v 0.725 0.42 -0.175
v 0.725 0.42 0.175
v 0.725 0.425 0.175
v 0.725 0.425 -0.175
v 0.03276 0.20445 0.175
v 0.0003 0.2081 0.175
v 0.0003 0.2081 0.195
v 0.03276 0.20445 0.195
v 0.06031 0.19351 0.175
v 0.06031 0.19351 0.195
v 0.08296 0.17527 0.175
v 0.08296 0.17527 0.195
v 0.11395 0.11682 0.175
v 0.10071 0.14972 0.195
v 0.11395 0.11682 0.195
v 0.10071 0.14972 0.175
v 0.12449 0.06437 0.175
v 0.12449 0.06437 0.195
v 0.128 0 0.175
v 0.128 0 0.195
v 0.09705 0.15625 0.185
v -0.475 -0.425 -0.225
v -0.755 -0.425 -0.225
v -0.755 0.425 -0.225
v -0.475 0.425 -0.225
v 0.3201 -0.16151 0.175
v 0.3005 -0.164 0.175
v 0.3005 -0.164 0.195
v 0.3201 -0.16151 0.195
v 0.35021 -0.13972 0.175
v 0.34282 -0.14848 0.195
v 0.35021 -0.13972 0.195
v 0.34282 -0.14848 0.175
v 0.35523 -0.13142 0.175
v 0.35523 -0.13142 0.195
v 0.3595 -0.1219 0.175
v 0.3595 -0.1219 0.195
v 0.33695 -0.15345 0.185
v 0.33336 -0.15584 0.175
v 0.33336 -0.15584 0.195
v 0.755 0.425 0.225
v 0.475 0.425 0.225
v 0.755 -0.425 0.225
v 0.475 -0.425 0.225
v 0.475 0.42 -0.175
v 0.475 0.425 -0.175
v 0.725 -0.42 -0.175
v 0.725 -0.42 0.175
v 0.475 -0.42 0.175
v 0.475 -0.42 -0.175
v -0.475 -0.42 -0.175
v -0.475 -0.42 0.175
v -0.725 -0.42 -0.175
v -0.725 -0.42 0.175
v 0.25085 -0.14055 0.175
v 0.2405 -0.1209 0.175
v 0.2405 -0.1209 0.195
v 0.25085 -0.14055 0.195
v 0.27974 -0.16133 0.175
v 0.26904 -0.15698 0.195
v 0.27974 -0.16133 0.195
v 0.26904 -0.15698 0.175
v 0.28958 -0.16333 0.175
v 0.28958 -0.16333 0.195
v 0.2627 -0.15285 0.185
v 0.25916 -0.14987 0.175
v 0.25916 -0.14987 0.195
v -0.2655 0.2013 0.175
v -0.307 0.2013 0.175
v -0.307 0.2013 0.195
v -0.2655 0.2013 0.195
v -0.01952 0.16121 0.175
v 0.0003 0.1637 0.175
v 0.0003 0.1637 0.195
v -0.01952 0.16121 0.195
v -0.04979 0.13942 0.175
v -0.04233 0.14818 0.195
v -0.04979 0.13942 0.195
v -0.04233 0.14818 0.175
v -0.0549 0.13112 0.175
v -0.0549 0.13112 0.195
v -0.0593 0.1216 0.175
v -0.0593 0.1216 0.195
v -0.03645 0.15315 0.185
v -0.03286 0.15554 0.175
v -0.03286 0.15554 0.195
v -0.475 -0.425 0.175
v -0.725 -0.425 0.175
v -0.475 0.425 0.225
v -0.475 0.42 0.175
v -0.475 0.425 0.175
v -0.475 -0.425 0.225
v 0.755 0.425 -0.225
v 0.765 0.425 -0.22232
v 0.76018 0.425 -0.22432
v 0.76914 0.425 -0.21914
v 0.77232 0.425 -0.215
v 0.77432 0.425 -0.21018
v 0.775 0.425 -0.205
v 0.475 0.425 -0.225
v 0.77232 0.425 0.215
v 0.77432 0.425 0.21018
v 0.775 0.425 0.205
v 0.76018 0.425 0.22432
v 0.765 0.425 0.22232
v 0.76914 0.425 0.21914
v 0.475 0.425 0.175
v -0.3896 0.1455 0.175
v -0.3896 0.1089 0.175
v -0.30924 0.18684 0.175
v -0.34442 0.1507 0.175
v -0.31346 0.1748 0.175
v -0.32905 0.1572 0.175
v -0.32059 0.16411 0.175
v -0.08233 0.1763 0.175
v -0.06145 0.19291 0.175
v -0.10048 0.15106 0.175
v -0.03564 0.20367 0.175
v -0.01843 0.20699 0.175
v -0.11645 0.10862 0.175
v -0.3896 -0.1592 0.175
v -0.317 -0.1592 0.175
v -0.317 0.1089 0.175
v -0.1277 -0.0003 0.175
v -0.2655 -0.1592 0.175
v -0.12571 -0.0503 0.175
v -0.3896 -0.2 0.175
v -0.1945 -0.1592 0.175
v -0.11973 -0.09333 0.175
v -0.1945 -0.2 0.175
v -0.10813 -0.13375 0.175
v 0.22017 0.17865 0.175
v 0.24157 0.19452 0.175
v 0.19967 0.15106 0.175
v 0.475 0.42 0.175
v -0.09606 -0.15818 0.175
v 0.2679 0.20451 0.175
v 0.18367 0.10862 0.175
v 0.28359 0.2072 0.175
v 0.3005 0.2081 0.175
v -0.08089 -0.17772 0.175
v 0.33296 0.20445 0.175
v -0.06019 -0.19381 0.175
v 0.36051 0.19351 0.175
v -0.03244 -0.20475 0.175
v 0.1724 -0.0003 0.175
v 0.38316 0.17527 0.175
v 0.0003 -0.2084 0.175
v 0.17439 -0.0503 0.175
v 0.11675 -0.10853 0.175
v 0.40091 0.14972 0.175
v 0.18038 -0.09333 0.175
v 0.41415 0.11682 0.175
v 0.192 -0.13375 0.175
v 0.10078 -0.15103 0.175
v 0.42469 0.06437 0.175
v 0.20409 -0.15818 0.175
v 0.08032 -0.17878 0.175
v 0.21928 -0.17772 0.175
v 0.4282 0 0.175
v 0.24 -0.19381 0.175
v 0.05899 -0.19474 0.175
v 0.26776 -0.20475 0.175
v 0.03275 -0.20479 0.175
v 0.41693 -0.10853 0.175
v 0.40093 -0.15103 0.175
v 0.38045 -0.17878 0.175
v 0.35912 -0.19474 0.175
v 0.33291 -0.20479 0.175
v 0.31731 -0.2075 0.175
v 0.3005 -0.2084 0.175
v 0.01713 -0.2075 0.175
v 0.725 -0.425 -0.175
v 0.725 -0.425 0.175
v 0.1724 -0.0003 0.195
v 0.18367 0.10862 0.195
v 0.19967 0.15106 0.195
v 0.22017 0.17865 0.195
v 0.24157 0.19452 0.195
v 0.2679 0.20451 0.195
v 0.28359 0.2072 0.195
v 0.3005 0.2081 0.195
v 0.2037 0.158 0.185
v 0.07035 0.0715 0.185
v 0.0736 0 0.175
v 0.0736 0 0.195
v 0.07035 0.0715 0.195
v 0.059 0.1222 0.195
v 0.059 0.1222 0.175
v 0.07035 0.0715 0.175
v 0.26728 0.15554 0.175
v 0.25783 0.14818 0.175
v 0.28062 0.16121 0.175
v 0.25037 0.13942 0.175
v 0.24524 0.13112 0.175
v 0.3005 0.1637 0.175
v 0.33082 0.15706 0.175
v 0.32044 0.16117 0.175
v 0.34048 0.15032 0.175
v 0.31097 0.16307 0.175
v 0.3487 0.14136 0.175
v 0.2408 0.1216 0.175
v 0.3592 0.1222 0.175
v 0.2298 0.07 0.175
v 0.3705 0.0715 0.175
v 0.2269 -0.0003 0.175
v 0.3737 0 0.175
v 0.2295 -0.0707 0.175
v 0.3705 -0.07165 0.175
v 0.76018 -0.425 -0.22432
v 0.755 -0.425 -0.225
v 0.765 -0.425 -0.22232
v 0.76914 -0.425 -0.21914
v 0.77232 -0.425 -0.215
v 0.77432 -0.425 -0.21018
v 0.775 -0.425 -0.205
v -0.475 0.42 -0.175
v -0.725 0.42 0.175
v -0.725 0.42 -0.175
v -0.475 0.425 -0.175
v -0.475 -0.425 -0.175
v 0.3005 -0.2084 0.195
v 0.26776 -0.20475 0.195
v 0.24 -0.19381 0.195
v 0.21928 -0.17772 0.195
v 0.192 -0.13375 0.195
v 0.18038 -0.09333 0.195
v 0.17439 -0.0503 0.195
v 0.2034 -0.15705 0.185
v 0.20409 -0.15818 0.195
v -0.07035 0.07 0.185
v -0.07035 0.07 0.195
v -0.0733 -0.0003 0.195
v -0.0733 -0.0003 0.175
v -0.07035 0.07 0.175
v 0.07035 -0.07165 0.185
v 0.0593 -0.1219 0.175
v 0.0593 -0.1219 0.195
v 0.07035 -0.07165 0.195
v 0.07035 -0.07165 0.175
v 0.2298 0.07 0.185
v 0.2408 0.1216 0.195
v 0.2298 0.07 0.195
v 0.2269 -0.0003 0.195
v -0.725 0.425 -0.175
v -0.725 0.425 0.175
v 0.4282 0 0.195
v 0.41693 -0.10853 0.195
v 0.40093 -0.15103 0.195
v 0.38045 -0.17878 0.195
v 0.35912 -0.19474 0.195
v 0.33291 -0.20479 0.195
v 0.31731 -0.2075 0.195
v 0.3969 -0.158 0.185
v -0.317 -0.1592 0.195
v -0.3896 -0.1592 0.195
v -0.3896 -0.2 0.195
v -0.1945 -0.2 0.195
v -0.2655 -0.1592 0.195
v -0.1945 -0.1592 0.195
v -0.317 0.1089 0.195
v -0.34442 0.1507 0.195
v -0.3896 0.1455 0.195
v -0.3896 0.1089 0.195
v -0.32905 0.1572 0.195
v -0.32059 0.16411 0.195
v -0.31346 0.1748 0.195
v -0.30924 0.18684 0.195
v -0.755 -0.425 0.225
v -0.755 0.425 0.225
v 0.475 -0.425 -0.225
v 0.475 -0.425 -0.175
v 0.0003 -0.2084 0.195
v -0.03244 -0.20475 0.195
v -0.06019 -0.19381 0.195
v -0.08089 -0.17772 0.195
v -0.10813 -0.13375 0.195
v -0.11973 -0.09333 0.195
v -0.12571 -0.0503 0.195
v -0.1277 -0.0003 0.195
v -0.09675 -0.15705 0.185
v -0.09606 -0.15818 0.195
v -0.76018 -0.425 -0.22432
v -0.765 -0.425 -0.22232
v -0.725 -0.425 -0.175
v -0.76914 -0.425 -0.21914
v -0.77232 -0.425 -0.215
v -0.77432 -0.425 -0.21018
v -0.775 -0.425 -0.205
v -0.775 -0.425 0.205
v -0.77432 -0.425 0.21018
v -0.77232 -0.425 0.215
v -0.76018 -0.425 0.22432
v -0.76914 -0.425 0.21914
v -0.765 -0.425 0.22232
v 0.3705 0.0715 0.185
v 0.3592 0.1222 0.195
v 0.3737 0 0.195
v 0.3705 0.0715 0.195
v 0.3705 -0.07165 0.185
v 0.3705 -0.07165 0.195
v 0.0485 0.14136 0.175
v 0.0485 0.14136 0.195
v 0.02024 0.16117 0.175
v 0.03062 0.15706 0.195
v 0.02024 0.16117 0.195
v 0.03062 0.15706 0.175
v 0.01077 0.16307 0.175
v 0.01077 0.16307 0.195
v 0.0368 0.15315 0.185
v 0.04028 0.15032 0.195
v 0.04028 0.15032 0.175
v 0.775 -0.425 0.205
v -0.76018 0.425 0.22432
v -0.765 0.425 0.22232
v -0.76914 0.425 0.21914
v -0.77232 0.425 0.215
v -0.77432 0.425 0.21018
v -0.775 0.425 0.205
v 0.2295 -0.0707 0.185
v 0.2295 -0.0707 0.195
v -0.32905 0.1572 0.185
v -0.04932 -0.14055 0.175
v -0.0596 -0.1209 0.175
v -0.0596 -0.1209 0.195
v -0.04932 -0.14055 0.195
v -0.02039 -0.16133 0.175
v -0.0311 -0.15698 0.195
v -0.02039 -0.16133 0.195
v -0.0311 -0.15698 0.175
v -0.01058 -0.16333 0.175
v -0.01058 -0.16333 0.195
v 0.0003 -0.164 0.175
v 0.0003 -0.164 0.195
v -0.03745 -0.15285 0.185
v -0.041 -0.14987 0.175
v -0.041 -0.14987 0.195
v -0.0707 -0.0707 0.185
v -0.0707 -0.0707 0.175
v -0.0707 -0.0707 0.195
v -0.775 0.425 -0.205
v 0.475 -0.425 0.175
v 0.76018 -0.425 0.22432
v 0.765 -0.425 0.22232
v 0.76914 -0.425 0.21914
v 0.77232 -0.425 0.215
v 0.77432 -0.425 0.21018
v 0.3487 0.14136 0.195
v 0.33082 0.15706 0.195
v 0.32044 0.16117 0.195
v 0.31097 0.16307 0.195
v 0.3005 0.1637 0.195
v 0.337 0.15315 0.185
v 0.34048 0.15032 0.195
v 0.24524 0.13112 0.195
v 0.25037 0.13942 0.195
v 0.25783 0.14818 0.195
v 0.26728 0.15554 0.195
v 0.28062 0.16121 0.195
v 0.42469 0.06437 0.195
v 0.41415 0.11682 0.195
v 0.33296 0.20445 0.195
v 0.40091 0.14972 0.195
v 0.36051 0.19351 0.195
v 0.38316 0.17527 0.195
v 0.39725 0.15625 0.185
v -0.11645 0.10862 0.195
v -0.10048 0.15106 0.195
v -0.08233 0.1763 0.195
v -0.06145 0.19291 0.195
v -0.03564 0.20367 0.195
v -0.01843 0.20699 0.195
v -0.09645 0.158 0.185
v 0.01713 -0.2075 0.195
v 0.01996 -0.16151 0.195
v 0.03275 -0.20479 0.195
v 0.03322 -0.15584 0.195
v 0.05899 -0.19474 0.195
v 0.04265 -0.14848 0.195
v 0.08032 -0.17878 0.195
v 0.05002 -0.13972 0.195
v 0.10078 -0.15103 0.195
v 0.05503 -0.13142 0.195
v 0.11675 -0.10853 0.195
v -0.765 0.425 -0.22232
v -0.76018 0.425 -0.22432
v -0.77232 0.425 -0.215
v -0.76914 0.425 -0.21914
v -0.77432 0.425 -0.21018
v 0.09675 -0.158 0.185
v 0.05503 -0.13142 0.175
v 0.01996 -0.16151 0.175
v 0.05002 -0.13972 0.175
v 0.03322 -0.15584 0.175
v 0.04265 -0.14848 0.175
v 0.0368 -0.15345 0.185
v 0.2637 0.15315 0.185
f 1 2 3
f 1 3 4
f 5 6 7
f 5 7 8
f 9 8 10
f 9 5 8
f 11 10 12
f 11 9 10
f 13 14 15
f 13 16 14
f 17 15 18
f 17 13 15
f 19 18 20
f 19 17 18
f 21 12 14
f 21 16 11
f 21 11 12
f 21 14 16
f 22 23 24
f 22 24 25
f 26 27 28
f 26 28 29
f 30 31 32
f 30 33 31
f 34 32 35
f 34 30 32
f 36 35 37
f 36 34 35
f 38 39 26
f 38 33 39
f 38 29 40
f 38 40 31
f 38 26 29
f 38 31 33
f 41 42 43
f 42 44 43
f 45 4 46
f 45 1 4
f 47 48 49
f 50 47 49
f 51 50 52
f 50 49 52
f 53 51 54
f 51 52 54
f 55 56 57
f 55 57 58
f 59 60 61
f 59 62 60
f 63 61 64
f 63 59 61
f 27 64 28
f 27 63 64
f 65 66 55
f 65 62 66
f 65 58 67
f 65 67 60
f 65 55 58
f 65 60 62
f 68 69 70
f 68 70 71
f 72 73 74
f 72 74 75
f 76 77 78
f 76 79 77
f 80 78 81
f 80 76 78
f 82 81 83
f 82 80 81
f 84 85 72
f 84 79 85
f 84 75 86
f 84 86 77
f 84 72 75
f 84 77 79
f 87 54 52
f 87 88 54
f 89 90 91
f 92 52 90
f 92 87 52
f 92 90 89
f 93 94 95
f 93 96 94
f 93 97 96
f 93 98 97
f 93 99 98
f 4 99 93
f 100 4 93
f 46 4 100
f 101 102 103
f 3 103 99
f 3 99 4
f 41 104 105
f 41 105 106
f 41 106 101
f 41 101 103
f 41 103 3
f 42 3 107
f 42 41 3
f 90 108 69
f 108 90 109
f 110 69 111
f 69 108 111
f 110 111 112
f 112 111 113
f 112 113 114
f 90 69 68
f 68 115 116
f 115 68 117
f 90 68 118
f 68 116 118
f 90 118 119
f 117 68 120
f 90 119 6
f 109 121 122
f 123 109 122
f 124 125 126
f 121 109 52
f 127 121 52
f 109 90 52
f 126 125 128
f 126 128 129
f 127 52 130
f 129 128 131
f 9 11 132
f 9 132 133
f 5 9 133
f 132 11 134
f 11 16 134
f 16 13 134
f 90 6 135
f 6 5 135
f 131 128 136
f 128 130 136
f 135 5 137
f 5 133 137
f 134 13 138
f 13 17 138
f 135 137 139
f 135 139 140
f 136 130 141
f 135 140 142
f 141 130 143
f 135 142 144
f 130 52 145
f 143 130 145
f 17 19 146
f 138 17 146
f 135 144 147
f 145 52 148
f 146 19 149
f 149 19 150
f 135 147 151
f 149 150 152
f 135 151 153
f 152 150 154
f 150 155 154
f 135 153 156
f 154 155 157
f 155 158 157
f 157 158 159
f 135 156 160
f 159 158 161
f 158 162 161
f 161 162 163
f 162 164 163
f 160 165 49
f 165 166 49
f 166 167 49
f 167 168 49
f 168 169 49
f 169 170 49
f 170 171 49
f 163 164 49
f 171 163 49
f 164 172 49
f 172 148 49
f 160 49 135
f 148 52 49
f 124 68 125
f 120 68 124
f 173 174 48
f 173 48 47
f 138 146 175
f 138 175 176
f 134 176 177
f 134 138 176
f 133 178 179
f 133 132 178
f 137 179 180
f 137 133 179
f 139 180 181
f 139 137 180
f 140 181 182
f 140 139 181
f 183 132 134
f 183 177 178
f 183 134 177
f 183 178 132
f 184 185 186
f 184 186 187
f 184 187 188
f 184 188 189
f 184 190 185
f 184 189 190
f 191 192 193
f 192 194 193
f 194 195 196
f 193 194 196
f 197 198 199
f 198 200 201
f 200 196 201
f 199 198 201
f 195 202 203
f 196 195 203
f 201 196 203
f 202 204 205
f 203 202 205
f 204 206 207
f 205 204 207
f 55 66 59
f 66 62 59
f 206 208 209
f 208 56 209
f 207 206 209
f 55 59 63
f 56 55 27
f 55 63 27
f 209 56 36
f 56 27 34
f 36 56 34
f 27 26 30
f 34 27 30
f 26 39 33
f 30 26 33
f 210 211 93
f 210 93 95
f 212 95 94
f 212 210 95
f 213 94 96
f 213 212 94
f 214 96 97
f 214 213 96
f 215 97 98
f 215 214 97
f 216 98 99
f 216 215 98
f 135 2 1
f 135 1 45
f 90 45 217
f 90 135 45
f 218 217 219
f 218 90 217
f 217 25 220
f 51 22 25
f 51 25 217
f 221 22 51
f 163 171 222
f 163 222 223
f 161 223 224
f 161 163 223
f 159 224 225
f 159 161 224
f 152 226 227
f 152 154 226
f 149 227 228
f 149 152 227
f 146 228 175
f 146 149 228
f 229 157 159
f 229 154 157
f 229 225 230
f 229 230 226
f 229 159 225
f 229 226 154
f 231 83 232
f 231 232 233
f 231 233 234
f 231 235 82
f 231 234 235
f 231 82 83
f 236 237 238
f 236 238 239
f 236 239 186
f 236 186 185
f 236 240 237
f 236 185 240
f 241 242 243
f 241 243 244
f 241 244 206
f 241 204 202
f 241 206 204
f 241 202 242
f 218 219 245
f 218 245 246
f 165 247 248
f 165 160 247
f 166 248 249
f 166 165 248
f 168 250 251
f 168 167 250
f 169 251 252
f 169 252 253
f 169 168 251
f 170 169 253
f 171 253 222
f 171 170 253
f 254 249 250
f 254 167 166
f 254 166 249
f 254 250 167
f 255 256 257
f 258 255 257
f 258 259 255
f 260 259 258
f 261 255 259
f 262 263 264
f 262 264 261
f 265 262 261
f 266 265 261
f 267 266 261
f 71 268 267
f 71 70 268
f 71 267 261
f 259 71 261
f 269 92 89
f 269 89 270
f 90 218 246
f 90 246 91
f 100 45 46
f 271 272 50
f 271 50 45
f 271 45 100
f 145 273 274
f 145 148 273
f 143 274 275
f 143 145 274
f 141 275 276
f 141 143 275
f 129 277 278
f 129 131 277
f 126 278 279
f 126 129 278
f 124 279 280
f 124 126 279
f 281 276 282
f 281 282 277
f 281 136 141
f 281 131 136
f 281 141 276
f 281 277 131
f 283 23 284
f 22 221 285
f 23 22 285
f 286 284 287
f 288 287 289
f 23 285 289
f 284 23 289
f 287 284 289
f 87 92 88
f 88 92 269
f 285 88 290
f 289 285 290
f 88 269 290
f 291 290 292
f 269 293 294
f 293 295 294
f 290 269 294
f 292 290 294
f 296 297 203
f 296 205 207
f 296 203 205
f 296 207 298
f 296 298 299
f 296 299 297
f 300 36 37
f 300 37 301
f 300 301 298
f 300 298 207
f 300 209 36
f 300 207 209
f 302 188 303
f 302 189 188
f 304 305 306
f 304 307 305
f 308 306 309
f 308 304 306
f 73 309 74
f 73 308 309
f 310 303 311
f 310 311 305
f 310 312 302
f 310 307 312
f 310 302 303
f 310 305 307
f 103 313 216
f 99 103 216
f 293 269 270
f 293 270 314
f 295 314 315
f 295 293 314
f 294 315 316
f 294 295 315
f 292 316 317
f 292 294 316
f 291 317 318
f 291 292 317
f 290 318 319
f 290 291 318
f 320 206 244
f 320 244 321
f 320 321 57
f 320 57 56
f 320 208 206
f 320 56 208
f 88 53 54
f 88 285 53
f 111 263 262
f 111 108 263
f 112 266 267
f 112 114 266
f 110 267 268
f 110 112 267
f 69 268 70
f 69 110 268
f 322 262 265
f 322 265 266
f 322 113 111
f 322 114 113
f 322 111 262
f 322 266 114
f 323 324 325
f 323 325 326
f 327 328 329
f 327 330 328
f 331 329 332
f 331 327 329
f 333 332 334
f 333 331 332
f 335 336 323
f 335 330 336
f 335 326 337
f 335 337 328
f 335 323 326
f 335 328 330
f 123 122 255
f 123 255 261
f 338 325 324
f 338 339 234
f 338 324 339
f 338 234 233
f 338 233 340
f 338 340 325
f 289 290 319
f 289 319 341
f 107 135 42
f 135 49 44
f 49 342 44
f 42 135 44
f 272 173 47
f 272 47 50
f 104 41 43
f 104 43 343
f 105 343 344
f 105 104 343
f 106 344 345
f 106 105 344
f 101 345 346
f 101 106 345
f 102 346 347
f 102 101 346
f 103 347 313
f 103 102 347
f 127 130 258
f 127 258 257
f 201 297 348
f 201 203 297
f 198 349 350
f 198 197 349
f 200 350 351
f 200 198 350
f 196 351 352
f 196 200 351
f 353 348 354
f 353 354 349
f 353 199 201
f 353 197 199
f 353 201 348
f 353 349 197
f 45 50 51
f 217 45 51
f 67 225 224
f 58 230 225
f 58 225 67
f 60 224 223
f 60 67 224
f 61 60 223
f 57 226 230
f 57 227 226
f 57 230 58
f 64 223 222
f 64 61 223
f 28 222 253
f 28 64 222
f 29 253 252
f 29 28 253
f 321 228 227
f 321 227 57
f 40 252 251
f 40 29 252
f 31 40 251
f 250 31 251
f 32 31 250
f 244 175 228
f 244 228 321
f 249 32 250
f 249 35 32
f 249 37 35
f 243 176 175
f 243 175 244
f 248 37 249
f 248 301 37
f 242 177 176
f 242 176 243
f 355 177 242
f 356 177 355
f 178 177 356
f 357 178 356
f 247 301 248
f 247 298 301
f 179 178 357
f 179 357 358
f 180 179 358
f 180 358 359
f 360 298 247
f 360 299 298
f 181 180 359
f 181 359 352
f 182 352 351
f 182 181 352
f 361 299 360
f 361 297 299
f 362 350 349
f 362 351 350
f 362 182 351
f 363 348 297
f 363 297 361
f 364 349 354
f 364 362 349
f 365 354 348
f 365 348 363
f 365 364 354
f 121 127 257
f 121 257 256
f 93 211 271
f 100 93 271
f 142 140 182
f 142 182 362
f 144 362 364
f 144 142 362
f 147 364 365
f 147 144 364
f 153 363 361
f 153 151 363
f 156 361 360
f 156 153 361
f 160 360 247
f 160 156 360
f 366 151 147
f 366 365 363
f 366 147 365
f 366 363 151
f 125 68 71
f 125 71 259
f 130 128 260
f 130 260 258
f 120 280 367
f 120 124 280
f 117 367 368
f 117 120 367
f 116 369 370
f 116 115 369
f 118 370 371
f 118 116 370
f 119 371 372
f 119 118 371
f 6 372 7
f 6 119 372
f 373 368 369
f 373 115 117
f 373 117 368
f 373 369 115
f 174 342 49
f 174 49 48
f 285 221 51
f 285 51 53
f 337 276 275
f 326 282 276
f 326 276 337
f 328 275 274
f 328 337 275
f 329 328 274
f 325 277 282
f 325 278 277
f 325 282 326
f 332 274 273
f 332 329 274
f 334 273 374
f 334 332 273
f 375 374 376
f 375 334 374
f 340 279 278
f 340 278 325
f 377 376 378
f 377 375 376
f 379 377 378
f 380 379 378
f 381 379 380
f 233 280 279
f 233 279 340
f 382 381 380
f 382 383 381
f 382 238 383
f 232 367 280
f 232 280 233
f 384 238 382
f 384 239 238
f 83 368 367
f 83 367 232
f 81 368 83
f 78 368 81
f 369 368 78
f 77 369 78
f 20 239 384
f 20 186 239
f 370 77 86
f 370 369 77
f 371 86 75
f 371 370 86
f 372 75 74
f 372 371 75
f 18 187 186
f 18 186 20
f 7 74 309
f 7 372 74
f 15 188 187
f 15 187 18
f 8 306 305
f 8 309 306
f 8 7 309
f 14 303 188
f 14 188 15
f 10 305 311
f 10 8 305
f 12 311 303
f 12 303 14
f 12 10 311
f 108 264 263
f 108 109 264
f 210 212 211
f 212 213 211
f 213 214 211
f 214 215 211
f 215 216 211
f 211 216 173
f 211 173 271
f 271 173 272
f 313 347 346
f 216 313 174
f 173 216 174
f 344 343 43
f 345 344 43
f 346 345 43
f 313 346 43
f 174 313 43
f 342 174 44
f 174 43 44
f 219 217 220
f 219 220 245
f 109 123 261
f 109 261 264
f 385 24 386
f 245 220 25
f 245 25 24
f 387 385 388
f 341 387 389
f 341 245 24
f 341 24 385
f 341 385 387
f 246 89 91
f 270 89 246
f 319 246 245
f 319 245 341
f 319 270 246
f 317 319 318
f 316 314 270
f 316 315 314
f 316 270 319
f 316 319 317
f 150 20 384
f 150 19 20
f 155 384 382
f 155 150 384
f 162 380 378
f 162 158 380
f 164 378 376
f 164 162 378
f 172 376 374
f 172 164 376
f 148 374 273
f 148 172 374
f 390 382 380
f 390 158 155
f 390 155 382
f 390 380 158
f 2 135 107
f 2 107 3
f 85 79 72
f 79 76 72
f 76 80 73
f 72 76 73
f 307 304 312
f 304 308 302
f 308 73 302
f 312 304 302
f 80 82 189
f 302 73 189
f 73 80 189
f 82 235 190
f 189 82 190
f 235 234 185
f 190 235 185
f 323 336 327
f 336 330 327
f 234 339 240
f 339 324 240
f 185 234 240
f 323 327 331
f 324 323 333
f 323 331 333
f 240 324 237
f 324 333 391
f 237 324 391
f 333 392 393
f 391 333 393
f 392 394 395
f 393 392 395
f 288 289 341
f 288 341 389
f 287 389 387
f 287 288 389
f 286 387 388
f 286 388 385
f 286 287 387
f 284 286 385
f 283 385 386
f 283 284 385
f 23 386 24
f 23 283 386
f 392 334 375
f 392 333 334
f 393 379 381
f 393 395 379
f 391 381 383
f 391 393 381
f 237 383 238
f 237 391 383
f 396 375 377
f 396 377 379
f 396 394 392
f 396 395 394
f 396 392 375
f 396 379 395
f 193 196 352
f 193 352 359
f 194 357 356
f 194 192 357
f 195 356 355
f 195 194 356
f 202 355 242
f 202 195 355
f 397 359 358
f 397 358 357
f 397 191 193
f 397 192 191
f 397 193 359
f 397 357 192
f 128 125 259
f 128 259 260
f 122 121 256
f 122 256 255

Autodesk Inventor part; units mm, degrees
ref_plane "YZ Plane" through (0, 0, 0) normal (1, 0, 0) x (0, 1, 0)
ref_plane "XZ Plane" through (0, 0, 0) normal (0, 1, 0) x (-1, 0, 0)
ref_plane "XY Plane" through (0, 0, 0) normal (0, 0, 1) x (1, 0, 0)
sketch "Sketch1" plane through (0, 0, 0) normal (0, 1, 0) x (-1, 0, 0)
  line L0 (0.725, 0.175) -> (-0.725, 0.175)
  line L1 (-0.725, 0.175) -> (-0.725, -0.175)
  line L2 (-0.725, -0.175) -> (0.725, -0.175)
  line L3 (0.725, -0.175) -> (0.725, 0.175)
  line L4 (0.475, 0.175) -> (0.475, 0.225)
  line L5 (0.475, 0.225) -> (0.775, 0.225)
  line L6 (0.775, 0.225) -> (0.775, -0.225)
  line L7 (0.775, -0.225) -> (0.475, -0.225)
  line L8 (0.475, -0.225) -> (0.475, -0.175)
  line L9 (-0.475, 0.175) -> (-0.475, 0.225)
  line L10 (-0.475, 0.225) -> (-0.775, 0.225)
  line L11 (-0.775, 0.225) -> (-0.775, -0.225)
  line L12 (-0.775, -0.225) -> (-0.475, -0.225)
  line L13 (-0.475, -0.175) -> (-0.475, -0.225)
  line L14 (0.475, 0.175) -> (-0.475, 0.175)
  point P0 (0, 0)
  point P1 (0, 0.175)
  point P2 (0.725, 0)
  dimension "d0" = 1.55
  dimension "d1" = 0.05
  dimension "d2" = 0.05
  dimension "d3" = 0.45
  dimension "d4" = 0.3
extrude "Extrusion1" add sketch "Sketch1" along normal mid plane 0.85 contours L0 L4 L5 L6 L7 L8 L2 L3 | L0 L1 L2 L13 L12 L11 L10 L9
extrude "Extrusion2" add sketch "Sketch1" along normal mid plane 0.84 contours L3 L2 L1 L0
sketch "Sketch2" plane through (-0.475, -0.42, 0.175) normal (0, 0, 1) x (1, 0, 0)
  line L0 (0, 0) -> (0, 0.84) projected
  line L1 (0.95, 0) -> (0, 0) projected
  line L2 (0.95, 0) -> (0.95, 0.84) projected
  line L3 (0, 0.84) -> (0.95, 0.84) projected
  line L4 (0, 0.42) -> (0.95, 0.42) construction
  line L5 (0.2805, 0.22) -> (0.0854, 0.22)
  line L6 (0.0854, 0.22) -> (0.0854, 0.2608)
  line L7 (0.0854, 0.2608) -> (0.158, 0.2608)
  line L8 (0.158, 0.2608) -> (0.158, 0.5289)
  line L9 (0.158, 0.5289) -> (0.0854, 0.5289)
  line L10 (0.0854, 0.5289) -> (0.0854, 0.5655)
  spline S0 degree 2 poles (0.0854, 0.5655) (0.1265, 0.5655) (0.1654, 0.5889) (0.168, 0.6213) knots 0 0 0 1 2 2 2
  line L11 (0.168, 0.6213) -> (0.2095, 0.6213)
  line L12 (0.2095, 0.6213) -> (0.2095, 0.2608)
  line L13 (0.2095, 0.2608) -> (0.2805, 0.2608)
  line L14 (0.2805, 0.2608) -> (0.2805, 0.22)
  spline S1 degree 2 poles (0.603, 0.42) (0.603, 0.3124) (0.5405, 0.2116) (0.4753, 0.2116) knots 0 0 0 1 2 2 2
  spline S2 degree 2 poles (0.4753, 0.2116) (0.4092, 0.2116) (0.3473, 0.3143) (0.3473, 0.4197) knots 0 0 0 1 2 2 2
  spline S3 degree 2 poles (0.3473, 0.4197) (0.3473, 0.5279) (0.4098, 0.6281) (0.4753, 0.6281) knots 0 0 0 1 2 2 2
  spline S4 degree 2 poles (0.4753, 0.6281) (0.5411, 0.6281) (0.603, 0.5244) (0.603, 0.42) knots 0 0 0 1 2 2 2
  spline S5 degree 2 poles (0.5343, 0.2981) (0.5421, 0.3179) (0.5486, 0.3788) (0.5486, 0.42) knots 0 0 0 1 2 2 2
  spline S6 degree 2 poles (0.5486, 0.42) (0.5486, 0.4612) (0.5421, 0.5218) (0.534, 0.5422) knots 0 0 0 1 2 2 2
  spline S7 degree 2 poles (0.534, 0.5422) (0.5259, 0.5626) (0.4977, 0.5837) (0.4753, 0.5837) knots 0 0 0 1 2 2 2
  spline S8 degree 2 poles (0.4753, 0.5837) (0.453, 0.5837) (0.4241, 0.5626) (0.4157, 0.5416) knots 0 0 0 1 2 2 2
  spline S9 degree 2 poles (0.4157, 0.5416) (0.4076, 0.5211) (0.4017, 0.4589) (0.4017, 0.4197) knots 0 0 0 1 2 2 2
  spline S10 degree 2 poles (0.4017, 0.4197) (0.4017, 0.3775) (0.4069, 0.3211) (0.4154, 0.2991) knots 0 0 0 1 2 2 2
  spline S11 degree 2 poles (0.4154, 0.2991) (0.4231, 0.2783) (0.452, 0.256) (0.4753, 0.256) knots 0 0 0 1 2 2 2
  spline S12 degree 2 poles (0.4753, 0.256) (0.4974, 0.256) (0.5262, 0.2771) (0.5343, 0.2981) knots 0 0 0 1 2 2 2
  spline S13 degree 2 poles (0.9032, 0.42) (0.9032, 0.3124) (0.8406, 0.2116) (0.7755, 0.2116) knots 0 0 0 1 2 2 2
  spline S14 degree 2 poles (0.7755, 0.2116) (0.7094, 0.2116) (0.6474, 0.3143) (0.6474, 0.4197) knots 0 0 0 1 2 2 2
  spline S15 degree 2 poles (0.6474, 0.4197) (0.6474, 0.5279) (0.71, 0.6281) (0.7755, 0.6281) knots 0 0 0 1 2 2 2
  spline S16 degree 2 poles (0.7755, 0.6281) (0.8413, 0.6281) (0.9032, 0.5244) (0.9032, 0.42) knots 0 0 0 1 2 2 2
  spline S17 degree 2 poles (0.8345, 0.2981) (0.8423, 0.3179) (0.8487, 0.3788) (0.8487, 0.42) knots 0 0 0 1 2 2 2
  spline S18 degree 2 poles (0.8487, 0.42) (0.8487, 0.4612) (0.8423, 0.5218) (0.8342, 0.5422) knots 0 0 0 1 2 2 2
  spline S19 degree 2 poles (0.8342, 0.5422) (0.8261, 0.5626) (0.7979, 0.5837) (0.7755, 0.5837) knots 0 0 0 1 2 2 2
  spline S20 degree 2 poles (0.7755, 0.5837) (0.7531, 0.5837) (0.7243, 0.5626) (0.7158, 0.5416) knots 0 0 0 1 2 2 2
  spline S21 degree 2 poles (0.7158, 0.5416) (0.7077, 0.5211) (0.7019, 0.4589) (0.7019, 0.4197) knots 0 0 0 1 2 2 2
  spline S22 degree 2 poles (0.7019, 0.4197) (0.7019, 0.3775) (0.7071, 0.3211) (0.7155, 0.2991) knots 0 0 0 1 2 2 2
  spline S23 degree 2 poles (0.7155, 0.2991) (0.7233, 0.2783) (0.7521, 0.256) (0.7755, 0.256) knots 0 0 0 1 2 2 2
  spline S24 degree 2 poles (0.7755, 0.256) (0.7975, 0.256) (0.8264, 0.2771) (0.8345, 0.2981) knots 0 0 0 1 2 2 2
  point P0 (0.475, 0.42)
extrude "Extrusion3" add sketch "Sketch2" along normal blind 0.02 contours L5 L6 L7 L8 L9 L10 S0 L11 L12 L13 L14 | S1 S2 S3 S4 | S13 S14 S15 S16
fillet "Fillet1" radius 0.02 4 edges at (-0.775, 0, 0.225) (-0.775, 0, -0.225) (0.775, 0, 0.225) (0.775, 0, -0.225)
equation "\"d2\" = d1"
properties part number "21-1001" material "Copper"
